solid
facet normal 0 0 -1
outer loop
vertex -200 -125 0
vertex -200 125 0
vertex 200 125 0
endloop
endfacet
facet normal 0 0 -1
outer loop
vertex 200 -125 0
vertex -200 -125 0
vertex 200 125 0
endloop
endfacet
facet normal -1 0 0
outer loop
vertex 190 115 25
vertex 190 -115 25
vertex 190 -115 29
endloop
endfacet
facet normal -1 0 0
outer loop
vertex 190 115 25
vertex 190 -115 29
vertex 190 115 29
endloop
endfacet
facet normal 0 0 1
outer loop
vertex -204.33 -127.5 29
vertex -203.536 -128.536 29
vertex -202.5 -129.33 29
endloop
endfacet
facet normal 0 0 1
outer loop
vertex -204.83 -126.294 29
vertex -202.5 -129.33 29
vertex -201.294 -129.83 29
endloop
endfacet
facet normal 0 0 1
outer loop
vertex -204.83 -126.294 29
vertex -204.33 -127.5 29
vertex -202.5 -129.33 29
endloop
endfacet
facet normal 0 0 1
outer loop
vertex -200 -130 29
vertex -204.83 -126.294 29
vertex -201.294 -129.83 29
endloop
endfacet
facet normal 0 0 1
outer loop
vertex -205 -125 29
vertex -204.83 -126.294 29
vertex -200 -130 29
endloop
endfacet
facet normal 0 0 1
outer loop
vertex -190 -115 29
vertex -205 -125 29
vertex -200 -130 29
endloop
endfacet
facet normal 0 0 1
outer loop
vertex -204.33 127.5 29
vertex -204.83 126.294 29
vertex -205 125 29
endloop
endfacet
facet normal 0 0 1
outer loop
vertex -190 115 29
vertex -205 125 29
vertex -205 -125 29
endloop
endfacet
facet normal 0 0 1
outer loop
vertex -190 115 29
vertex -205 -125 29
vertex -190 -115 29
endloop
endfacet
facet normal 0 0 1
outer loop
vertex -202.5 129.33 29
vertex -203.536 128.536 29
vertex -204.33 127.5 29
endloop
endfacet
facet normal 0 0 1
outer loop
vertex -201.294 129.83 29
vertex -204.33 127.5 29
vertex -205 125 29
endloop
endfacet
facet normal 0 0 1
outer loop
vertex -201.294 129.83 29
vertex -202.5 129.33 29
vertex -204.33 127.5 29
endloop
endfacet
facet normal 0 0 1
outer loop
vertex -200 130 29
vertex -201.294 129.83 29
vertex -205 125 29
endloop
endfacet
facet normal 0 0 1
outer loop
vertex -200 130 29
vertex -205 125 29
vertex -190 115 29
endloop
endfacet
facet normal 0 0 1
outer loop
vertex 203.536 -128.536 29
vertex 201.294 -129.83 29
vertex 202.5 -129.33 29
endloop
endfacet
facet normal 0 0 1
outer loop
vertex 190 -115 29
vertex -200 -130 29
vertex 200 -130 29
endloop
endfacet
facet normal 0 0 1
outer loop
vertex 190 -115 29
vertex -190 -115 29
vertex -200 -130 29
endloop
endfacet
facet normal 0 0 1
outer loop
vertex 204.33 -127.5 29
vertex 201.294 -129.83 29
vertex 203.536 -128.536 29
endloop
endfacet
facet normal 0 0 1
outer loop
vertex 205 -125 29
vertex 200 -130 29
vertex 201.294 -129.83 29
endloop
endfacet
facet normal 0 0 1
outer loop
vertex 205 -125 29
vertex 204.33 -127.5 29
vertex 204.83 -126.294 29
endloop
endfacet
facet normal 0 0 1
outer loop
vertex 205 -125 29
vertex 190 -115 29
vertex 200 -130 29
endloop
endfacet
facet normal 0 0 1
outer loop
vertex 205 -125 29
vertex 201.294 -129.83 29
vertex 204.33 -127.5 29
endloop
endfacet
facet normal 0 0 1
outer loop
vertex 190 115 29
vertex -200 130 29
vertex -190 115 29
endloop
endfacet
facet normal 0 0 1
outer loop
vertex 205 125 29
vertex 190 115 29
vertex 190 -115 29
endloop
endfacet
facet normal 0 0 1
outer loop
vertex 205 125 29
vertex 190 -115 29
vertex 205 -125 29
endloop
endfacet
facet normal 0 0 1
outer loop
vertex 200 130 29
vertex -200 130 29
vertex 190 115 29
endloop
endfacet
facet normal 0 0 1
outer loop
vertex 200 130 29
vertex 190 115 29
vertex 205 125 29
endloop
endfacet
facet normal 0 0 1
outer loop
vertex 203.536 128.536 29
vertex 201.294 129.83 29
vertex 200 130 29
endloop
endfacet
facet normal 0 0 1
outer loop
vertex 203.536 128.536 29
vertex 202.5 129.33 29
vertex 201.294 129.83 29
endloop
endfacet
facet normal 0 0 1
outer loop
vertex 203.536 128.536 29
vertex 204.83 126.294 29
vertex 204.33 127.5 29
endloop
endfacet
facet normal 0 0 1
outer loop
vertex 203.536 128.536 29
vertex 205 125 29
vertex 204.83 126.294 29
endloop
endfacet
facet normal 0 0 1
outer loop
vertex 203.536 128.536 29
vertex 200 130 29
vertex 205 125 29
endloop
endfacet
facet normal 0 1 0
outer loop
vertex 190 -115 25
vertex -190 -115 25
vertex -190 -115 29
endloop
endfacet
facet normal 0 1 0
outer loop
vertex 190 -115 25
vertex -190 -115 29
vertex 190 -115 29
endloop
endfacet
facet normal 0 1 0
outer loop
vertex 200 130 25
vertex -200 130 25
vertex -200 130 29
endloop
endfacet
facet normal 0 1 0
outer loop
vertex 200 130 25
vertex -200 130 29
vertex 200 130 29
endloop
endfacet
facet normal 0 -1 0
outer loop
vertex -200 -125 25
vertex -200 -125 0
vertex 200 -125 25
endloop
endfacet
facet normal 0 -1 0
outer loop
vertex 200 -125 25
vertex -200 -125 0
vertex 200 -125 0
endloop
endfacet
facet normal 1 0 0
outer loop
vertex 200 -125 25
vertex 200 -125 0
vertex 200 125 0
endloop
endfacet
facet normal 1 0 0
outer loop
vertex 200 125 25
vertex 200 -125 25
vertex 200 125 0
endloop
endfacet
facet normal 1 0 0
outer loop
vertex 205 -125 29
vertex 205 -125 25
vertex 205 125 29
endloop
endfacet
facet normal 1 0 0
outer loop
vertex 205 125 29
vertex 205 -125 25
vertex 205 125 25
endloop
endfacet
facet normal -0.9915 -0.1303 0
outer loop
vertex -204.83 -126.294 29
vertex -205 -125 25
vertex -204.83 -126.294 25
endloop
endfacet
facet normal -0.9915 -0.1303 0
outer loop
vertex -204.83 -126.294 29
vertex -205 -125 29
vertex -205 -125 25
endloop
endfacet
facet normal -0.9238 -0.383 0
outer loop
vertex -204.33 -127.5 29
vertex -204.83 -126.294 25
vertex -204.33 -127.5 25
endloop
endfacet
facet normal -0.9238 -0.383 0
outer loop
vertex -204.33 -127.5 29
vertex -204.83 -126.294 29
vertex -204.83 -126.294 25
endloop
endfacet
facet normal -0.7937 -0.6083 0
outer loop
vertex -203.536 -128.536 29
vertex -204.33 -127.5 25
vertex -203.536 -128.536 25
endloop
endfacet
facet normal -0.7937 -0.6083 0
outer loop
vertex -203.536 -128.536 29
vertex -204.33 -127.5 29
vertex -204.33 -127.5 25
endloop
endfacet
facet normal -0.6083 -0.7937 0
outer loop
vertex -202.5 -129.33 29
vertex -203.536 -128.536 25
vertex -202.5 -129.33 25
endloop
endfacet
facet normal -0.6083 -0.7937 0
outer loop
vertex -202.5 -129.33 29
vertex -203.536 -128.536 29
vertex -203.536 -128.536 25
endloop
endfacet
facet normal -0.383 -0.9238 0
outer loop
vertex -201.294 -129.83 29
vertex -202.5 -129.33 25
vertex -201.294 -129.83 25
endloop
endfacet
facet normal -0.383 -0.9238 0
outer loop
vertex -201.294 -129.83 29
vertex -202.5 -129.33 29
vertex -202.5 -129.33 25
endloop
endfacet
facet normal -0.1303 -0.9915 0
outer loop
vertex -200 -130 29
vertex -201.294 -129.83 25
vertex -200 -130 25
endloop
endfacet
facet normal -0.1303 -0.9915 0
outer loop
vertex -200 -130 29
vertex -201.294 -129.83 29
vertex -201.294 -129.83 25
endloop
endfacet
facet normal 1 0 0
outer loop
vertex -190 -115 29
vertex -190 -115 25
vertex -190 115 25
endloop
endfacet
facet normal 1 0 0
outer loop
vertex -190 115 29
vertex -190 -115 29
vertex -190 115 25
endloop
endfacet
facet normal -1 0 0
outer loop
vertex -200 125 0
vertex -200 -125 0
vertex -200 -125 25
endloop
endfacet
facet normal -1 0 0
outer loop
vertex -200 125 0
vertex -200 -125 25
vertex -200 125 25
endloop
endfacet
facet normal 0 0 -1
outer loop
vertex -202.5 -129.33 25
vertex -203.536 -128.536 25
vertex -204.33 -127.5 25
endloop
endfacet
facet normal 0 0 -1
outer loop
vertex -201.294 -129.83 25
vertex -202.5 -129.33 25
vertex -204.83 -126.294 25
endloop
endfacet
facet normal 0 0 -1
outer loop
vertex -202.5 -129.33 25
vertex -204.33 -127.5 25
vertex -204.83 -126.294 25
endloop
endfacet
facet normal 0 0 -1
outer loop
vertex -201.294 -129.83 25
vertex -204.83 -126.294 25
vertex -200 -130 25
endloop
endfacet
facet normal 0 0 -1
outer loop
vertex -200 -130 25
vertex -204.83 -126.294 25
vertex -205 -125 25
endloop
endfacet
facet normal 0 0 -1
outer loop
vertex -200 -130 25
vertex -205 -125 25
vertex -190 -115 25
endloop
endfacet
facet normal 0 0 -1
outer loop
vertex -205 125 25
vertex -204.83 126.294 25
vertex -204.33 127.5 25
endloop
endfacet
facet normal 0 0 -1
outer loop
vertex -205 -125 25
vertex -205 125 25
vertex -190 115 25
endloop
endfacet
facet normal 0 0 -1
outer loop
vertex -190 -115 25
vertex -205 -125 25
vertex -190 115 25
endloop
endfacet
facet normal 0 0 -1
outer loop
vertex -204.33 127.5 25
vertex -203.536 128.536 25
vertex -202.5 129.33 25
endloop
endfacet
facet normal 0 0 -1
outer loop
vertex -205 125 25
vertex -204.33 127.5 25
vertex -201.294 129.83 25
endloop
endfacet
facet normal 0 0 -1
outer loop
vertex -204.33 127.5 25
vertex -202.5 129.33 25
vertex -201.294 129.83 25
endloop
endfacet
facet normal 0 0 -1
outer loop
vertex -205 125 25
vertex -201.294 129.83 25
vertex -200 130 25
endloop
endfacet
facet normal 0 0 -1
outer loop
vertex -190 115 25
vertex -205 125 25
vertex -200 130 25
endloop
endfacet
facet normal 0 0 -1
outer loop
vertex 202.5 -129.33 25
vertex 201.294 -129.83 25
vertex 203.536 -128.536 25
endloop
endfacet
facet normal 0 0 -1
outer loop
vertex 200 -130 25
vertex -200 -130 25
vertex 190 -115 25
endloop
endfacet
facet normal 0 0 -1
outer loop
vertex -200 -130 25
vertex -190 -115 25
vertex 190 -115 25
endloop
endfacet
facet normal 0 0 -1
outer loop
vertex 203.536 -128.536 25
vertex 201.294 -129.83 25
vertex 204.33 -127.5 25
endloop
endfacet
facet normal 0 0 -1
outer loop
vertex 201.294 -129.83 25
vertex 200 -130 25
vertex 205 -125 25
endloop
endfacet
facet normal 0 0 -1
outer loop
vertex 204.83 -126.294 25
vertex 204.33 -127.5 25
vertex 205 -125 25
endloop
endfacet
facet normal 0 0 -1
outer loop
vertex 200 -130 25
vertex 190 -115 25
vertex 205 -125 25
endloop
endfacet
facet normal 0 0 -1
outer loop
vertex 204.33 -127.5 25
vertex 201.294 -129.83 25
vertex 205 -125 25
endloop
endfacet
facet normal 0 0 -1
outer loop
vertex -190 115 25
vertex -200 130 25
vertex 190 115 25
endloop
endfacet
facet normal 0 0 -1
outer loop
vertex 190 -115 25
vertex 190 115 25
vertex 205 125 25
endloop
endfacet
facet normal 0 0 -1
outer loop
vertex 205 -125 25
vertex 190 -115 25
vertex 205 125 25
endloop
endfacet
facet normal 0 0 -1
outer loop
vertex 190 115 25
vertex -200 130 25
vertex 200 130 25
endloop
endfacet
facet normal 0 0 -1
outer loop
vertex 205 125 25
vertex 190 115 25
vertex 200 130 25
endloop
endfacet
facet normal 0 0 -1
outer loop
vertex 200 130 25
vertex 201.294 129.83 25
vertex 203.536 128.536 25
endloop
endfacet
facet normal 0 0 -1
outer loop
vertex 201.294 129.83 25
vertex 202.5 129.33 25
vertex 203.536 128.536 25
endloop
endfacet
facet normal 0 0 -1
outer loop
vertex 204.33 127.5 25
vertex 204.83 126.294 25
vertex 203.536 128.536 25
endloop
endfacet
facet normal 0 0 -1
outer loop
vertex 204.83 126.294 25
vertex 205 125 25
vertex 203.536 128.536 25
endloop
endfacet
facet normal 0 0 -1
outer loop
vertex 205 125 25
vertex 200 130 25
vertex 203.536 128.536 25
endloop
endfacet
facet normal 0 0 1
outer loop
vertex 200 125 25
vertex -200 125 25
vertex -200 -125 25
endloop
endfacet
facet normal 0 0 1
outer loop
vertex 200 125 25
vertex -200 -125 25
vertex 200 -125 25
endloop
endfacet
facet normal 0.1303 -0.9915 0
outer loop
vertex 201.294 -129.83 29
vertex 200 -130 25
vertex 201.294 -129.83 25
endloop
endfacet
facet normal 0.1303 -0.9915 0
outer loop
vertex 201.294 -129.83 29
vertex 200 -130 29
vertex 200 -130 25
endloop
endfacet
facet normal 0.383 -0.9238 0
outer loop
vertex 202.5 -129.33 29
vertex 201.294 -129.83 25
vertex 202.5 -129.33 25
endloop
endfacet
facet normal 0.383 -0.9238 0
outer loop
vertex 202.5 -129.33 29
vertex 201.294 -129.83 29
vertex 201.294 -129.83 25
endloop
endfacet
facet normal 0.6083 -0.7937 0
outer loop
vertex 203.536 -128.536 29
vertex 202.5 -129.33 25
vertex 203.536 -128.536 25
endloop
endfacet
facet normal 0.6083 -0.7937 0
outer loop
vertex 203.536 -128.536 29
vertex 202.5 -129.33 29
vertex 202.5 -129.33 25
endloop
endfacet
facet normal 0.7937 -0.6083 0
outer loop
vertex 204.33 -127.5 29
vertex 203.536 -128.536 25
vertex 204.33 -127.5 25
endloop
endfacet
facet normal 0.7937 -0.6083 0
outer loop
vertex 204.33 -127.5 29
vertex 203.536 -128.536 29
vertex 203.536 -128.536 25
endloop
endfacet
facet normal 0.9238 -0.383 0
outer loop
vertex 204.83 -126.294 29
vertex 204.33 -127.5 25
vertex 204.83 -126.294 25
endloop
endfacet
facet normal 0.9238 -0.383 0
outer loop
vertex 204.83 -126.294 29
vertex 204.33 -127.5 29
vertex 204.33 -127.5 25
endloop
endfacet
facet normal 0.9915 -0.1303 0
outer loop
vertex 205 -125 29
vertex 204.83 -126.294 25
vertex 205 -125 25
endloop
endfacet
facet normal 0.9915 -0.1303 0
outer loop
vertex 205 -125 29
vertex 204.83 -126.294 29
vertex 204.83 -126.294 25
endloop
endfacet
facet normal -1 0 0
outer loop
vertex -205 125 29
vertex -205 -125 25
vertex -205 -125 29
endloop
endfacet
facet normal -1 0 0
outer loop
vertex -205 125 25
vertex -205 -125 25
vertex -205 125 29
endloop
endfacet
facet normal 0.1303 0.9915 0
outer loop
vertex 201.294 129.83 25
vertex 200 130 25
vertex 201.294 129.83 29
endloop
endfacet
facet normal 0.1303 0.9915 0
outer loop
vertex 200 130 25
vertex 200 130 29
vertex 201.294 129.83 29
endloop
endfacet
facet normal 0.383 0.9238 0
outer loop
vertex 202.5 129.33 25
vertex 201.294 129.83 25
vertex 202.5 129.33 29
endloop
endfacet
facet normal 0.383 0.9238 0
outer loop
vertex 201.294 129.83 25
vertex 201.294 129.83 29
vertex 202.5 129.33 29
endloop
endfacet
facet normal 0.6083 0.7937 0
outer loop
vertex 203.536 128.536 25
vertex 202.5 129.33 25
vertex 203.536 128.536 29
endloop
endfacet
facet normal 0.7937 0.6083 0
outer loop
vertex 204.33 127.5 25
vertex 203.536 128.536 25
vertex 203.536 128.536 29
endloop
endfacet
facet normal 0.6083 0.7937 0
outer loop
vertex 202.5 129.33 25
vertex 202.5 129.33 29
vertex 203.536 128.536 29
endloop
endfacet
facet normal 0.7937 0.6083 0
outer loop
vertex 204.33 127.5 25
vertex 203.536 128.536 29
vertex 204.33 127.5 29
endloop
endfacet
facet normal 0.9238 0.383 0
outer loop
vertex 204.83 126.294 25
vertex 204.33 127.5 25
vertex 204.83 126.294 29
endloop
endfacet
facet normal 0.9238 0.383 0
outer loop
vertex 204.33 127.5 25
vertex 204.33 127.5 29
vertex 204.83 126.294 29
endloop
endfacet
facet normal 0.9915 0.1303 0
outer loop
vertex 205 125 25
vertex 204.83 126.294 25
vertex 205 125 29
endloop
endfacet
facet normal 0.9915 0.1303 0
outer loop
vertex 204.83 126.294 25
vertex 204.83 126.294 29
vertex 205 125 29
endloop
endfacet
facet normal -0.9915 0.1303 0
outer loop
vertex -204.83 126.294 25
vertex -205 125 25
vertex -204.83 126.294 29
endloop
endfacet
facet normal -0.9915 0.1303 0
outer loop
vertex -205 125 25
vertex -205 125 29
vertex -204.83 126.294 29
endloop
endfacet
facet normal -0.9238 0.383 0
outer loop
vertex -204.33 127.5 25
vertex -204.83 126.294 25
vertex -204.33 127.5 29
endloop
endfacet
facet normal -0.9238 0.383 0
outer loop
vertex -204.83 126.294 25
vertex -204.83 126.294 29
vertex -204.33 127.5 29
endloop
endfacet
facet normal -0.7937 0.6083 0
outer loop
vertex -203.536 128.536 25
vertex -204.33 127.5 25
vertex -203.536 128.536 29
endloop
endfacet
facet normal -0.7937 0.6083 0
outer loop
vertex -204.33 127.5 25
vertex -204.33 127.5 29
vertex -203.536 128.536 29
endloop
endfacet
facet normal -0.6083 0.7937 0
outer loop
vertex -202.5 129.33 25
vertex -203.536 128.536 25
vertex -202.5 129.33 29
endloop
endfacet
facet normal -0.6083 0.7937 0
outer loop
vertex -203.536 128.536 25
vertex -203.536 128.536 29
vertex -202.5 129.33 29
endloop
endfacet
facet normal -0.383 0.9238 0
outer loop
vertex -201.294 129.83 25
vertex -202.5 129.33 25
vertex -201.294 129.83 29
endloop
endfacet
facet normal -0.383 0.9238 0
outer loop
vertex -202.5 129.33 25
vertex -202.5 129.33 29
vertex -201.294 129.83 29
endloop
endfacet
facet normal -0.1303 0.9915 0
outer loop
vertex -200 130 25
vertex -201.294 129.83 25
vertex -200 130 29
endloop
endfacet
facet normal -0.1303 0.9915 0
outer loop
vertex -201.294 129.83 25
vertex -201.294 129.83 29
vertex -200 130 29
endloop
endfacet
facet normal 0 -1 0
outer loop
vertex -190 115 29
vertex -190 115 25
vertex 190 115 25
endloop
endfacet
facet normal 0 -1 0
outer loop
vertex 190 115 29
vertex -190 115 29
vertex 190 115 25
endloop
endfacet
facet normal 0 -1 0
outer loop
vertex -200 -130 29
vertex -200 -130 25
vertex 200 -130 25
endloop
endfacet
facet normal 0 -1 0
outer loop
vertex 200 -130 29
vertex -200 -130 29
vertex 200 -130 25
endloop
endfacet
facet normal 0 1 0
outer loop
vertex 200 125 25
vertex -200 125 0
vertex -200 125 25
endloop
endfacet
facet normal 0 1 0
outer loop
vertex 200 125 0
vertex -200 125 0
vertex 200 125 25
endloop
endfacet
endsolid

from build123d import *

# Parameters (mm, degrees)
F0_W     = 400
F0_H     = 250
F1_DEPTH = 25
F2_W     = 410
F2_H     = 260
F2_W_2   = 380
F2_H_2   = 230
F3_DEPTH = 4
F4_R     = 5


with BuildPart() as f1:
    # F0 (on Top) → F1 (new body)
    with BuildSketch(Plane.XY):
        Rectangle(F0_W, F0_H)
    extrude(amount=F1_DEPTH)


with BuildPart() as f3:
    # F2 (on face) → F3 (new body)
    with BuildSketch(Plane.XY.offset(25)):
        Rectangle(F2_W, F2_H)
        Rectangle(F2_W_2, F2_H_2, mode=Mode.SUBTRACT)
    extrude(amount=F3_DEPTH)

    # F4
    f4_edges = [f3.edges().sort_by_distance(p)[0] for p in [
        (-205, -130, 27),
        (-205, 130, 27),
        (205, -130, 27),
        (205, 130, 27),
    ]]
    fillet(f4_edges, radius=F4_R)


solid = Compound([f1.part, f3.part])
